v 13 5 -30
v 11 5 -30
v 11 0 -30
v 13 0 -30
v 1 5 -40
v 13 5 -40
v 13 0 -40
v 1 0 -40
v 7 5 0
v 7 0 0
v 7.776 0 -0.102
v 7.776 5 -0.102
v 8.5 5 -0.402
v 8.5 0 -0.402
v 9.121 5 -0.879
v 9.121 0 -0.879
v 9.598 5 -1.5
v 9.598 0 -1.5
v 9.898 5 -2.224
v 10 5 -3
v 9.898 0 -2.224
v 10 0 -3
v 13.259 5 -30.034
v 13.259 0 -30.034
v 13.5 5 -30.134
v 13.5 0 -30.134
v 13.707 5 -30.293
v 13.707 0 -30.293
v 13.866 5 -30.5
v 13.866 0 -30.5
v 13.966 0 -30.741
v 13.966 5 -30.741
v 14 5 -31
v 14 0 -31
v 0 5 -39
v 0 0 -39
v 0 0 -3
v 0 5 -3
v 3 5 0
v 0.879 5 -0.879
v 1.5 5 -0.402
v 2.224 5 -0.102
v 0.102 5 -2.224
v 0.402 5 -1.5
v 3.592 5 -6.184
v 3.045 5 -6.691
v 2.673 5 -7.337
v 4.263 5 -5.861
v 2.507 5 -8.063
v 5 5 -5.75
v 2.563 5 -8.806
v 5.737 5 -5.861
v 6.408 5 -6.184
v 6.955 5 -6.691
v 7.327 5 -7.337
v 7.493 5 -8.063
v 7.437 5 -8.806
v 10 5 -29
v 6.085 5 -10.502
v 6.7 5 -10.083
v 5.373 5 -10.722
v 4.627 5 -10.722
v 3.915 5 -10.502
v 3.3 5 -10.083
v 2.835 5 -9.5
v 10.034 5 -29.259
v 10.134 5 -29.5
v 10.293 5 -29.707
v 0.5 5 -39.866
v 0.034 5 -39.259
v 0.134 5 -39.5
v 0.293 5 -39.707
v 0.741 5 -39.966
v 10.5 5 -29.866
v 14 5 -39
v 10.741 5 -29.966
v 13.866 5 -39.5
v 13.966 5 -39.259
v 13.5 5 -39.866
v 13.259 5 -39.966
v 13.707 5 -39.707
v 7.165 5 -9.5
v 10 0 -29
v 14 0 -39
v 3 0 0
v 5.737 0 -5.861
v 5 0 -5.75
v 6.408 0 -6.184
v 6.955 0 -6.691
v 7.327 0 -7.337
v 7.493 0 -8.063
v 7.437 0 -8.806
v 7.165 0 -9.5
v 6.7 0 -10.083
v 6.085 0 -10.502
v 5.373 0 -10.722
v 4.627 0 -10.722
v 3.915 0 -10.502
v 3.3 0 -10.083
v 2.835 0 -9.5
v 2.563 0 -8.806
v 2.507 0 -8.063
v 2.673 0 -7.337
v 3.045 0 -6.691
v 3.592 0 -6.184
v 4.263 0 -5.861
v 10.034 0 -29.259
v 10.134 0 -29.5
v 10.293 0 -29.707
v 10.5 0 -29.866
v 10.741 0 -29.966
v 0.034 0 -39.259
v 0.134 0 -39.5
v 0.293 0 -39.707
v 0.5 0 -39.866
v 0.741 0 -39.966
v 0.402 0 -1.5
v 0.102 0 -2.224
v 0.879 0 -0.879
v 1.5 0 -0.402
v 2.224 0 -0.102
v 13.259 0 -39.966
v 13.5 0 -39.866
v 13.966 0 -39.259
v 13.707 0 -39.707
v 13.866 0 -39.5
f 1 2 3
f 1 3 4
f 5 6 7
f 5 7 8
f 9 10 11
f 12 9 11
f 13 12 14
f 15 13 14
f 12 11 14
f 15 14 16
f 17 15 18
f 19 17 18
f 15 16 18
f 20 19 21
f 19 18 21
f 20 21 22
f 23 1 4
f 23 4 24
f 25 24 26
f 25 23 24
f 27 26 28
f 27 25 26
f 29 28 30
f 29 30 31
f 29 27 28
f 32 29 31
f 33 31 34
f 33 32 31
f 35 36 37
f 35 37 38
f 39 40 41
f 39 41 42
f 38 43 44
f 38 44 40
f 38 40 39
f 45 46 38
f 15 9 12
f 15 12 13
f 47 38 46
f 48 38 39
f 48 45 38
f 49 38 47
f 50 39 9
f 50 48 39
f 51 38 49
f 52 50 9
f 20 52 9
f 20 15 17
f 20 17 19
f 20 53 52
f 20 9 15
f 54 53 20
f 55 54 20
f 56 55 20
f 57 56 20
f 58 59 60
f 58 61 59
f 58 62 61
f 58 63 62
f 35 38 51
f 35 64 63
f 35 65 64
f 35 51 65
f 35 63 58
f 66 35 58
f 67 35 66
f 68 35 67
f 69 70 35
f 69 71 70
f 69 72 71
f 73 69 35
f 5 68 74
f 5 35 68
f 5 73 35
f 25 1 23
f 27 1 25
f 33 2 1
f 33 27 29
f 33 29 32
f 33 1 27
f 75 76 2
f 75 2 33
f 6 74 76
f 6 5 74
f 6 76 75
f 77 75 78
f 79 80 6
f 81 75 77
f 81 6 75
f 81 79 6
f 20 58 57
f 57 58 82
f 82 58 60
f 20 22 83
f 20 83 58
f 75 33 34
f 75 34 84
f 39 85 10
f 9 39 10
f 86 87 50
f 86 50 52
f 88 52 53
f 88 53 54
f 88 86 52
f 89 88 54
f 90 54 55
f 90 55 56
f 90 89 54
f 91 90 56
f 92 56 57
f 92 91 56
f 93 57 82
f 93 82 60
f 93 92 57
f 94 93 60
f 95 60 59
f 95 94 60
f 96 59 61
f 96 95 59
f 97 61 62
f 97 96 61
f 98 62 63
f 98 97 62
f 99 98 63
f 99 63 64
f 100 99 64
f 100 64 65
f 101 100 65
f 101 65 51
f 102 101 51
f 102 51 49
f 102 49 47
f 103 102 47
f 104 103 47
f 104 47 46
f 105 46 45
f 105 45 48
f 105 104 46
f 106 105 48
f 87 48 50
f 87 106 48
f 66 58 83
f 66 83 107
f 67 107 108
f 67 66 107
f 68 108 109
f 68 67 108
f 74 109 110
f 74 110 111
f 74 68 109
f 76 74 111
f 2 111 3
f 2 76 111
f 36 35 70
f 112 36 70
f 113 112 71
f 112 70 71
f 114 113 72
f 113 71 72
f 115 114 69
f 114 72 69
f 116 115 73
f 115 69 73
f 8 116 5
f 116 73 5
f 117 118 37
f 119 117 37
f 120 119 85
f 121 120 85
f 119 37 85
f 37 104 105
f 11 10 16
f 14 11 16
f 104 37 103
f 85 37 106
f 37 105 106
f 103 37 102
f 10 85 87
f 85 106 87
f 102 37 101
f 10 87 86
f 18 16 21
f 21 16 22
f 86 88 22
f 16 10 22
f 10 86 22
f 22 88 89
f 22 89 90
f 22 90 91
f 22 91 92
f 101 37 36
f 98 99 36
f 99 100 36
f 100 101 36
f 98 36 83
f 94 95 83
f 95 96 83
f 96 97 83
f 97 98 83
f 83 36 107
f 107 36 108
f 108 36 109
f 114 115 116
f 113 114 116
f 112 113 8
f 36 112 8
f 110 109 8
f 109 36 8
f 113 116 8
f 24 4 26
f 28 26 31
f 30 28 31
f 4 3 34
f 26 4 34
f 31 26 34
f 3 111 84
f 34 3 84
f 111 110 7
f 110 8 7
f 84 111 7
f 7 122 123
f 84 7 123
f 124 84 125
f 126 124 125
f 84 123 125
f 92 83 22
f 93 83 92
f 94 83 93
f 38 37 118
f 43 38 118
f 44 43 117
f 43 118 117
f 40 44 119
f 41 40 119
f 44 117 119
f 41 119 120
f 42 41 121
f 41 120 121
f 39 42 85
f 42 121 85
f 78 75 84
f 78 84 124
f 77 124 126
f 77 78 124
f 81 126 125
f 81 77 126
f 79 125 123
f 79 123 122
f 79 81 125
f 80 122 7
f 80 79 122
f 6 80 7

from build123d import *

# Parameters (mm, degrees)
SKETCH_1_R          = 2.5
EXTRUDE_1_DEPTH     = 5
SKETCH_2_W          = 10
SKETCH_2_H          = 5
EXTRUDE_2_DEPTH     = 10
EXTRUDE_3_DEPTH     = 5
CUT_EXTRUDE_1_DEPTH = 43.673176587


with BuildPart() as part:
    # Эскиз1 → Бобышка-Вытянуть1 (new body)
    with BuildSketch(Plane(origin=(0, 0, 0), x_dir=(1, 0, 0), z_dir=(0, 1, 0))):
        with BuildLine():
            Line((3, 0), (7, 0))
            ThreePointArc((7, 0), (9.121320344, 0.878679656), (10, 3))
            Line((10, 3), (10, 30))
            Line((10, 30), (0, 30))
            Line((0, 30), (0, 3))
            ThreePointArc((0, 3), (0.878679656, 0.878679656), (3, 0))
        make_face()
        with Locations(Location((5, 8.25, 0), (0, 0, 270))):
            Circle(SKETCH_1_R, mode=Mode.SUBTRACT)
    extrude(amount=EXTRUDE_1_DEPTH)

    # Эскиз2 → Бобышка-Вытянуть2 (add)
    with BuildSketch(Plane(origin=(0, 0, -30), x_dir=(-1, 0, 0), z_dir=(0, 0, -1))):
        with Locations((-5, 2.5)):
            Rectangle(SKETCH_2_W, SKETCH_2_H)
    extrude(amount=EXTRUDE_2_DEPTH)

    # Эскиз4 → Бобышка-Вытянуть3 (add)
    with BuildSketch(Plane(origin=(0, 5, 0), x_dir=(1, 0, 0), z_dir=(0, 1, 0))):
        with BuildLine():
            Line((13, 40), (10, 40))
            Line((10, 40), (10, 29))
            ThreePointArc((10, 29), (10.292893219, 29.707106781), (11, 30))
            Line((11, 30), (13, 30))
            ThreePointArc((13, 30), (13.707106781, 30.292893219), (14, 31))
            Line((14, 31), (14, 39))
            ThreePointArc((14, 39), (13.707106781, 39.707106781), (13, 40))
        make_face()
    extrude(amount=-EXTRUDE_3_DEPTH)

    # Эскиз5 → Вырез-Вытянуть1 (cut, through all)
    with BuildSketch(Plane(origin=(0, 5, 0), x_dir=(1, 0, 0), z_dir=(0, 1, 0))):
        with BuildLine():
            Line((0, 38.89263227), (0, 39))
            ThreePointArc((0, 39), (0.292893219, 39.707106781), (1, 40))
            Line((1, 40), (1.042017626, 40))
            Line((1.042017626, 40), (0.948883757, 40.294542088))
            Line((0.948883757, 40.294542088), (-0.497142104, 40.245524262))
            Line((-0.497142104, 40.245524262), (-0.497142104, 39.412221223))
            Line((-0.497142104, 39.412221223), (0, 38.89263227))
        make_face()
    extrude(amount=-CUT_EXTRUDE_1_DEPTH, mode=Mode.SUBTRACT)


solid = part.part
